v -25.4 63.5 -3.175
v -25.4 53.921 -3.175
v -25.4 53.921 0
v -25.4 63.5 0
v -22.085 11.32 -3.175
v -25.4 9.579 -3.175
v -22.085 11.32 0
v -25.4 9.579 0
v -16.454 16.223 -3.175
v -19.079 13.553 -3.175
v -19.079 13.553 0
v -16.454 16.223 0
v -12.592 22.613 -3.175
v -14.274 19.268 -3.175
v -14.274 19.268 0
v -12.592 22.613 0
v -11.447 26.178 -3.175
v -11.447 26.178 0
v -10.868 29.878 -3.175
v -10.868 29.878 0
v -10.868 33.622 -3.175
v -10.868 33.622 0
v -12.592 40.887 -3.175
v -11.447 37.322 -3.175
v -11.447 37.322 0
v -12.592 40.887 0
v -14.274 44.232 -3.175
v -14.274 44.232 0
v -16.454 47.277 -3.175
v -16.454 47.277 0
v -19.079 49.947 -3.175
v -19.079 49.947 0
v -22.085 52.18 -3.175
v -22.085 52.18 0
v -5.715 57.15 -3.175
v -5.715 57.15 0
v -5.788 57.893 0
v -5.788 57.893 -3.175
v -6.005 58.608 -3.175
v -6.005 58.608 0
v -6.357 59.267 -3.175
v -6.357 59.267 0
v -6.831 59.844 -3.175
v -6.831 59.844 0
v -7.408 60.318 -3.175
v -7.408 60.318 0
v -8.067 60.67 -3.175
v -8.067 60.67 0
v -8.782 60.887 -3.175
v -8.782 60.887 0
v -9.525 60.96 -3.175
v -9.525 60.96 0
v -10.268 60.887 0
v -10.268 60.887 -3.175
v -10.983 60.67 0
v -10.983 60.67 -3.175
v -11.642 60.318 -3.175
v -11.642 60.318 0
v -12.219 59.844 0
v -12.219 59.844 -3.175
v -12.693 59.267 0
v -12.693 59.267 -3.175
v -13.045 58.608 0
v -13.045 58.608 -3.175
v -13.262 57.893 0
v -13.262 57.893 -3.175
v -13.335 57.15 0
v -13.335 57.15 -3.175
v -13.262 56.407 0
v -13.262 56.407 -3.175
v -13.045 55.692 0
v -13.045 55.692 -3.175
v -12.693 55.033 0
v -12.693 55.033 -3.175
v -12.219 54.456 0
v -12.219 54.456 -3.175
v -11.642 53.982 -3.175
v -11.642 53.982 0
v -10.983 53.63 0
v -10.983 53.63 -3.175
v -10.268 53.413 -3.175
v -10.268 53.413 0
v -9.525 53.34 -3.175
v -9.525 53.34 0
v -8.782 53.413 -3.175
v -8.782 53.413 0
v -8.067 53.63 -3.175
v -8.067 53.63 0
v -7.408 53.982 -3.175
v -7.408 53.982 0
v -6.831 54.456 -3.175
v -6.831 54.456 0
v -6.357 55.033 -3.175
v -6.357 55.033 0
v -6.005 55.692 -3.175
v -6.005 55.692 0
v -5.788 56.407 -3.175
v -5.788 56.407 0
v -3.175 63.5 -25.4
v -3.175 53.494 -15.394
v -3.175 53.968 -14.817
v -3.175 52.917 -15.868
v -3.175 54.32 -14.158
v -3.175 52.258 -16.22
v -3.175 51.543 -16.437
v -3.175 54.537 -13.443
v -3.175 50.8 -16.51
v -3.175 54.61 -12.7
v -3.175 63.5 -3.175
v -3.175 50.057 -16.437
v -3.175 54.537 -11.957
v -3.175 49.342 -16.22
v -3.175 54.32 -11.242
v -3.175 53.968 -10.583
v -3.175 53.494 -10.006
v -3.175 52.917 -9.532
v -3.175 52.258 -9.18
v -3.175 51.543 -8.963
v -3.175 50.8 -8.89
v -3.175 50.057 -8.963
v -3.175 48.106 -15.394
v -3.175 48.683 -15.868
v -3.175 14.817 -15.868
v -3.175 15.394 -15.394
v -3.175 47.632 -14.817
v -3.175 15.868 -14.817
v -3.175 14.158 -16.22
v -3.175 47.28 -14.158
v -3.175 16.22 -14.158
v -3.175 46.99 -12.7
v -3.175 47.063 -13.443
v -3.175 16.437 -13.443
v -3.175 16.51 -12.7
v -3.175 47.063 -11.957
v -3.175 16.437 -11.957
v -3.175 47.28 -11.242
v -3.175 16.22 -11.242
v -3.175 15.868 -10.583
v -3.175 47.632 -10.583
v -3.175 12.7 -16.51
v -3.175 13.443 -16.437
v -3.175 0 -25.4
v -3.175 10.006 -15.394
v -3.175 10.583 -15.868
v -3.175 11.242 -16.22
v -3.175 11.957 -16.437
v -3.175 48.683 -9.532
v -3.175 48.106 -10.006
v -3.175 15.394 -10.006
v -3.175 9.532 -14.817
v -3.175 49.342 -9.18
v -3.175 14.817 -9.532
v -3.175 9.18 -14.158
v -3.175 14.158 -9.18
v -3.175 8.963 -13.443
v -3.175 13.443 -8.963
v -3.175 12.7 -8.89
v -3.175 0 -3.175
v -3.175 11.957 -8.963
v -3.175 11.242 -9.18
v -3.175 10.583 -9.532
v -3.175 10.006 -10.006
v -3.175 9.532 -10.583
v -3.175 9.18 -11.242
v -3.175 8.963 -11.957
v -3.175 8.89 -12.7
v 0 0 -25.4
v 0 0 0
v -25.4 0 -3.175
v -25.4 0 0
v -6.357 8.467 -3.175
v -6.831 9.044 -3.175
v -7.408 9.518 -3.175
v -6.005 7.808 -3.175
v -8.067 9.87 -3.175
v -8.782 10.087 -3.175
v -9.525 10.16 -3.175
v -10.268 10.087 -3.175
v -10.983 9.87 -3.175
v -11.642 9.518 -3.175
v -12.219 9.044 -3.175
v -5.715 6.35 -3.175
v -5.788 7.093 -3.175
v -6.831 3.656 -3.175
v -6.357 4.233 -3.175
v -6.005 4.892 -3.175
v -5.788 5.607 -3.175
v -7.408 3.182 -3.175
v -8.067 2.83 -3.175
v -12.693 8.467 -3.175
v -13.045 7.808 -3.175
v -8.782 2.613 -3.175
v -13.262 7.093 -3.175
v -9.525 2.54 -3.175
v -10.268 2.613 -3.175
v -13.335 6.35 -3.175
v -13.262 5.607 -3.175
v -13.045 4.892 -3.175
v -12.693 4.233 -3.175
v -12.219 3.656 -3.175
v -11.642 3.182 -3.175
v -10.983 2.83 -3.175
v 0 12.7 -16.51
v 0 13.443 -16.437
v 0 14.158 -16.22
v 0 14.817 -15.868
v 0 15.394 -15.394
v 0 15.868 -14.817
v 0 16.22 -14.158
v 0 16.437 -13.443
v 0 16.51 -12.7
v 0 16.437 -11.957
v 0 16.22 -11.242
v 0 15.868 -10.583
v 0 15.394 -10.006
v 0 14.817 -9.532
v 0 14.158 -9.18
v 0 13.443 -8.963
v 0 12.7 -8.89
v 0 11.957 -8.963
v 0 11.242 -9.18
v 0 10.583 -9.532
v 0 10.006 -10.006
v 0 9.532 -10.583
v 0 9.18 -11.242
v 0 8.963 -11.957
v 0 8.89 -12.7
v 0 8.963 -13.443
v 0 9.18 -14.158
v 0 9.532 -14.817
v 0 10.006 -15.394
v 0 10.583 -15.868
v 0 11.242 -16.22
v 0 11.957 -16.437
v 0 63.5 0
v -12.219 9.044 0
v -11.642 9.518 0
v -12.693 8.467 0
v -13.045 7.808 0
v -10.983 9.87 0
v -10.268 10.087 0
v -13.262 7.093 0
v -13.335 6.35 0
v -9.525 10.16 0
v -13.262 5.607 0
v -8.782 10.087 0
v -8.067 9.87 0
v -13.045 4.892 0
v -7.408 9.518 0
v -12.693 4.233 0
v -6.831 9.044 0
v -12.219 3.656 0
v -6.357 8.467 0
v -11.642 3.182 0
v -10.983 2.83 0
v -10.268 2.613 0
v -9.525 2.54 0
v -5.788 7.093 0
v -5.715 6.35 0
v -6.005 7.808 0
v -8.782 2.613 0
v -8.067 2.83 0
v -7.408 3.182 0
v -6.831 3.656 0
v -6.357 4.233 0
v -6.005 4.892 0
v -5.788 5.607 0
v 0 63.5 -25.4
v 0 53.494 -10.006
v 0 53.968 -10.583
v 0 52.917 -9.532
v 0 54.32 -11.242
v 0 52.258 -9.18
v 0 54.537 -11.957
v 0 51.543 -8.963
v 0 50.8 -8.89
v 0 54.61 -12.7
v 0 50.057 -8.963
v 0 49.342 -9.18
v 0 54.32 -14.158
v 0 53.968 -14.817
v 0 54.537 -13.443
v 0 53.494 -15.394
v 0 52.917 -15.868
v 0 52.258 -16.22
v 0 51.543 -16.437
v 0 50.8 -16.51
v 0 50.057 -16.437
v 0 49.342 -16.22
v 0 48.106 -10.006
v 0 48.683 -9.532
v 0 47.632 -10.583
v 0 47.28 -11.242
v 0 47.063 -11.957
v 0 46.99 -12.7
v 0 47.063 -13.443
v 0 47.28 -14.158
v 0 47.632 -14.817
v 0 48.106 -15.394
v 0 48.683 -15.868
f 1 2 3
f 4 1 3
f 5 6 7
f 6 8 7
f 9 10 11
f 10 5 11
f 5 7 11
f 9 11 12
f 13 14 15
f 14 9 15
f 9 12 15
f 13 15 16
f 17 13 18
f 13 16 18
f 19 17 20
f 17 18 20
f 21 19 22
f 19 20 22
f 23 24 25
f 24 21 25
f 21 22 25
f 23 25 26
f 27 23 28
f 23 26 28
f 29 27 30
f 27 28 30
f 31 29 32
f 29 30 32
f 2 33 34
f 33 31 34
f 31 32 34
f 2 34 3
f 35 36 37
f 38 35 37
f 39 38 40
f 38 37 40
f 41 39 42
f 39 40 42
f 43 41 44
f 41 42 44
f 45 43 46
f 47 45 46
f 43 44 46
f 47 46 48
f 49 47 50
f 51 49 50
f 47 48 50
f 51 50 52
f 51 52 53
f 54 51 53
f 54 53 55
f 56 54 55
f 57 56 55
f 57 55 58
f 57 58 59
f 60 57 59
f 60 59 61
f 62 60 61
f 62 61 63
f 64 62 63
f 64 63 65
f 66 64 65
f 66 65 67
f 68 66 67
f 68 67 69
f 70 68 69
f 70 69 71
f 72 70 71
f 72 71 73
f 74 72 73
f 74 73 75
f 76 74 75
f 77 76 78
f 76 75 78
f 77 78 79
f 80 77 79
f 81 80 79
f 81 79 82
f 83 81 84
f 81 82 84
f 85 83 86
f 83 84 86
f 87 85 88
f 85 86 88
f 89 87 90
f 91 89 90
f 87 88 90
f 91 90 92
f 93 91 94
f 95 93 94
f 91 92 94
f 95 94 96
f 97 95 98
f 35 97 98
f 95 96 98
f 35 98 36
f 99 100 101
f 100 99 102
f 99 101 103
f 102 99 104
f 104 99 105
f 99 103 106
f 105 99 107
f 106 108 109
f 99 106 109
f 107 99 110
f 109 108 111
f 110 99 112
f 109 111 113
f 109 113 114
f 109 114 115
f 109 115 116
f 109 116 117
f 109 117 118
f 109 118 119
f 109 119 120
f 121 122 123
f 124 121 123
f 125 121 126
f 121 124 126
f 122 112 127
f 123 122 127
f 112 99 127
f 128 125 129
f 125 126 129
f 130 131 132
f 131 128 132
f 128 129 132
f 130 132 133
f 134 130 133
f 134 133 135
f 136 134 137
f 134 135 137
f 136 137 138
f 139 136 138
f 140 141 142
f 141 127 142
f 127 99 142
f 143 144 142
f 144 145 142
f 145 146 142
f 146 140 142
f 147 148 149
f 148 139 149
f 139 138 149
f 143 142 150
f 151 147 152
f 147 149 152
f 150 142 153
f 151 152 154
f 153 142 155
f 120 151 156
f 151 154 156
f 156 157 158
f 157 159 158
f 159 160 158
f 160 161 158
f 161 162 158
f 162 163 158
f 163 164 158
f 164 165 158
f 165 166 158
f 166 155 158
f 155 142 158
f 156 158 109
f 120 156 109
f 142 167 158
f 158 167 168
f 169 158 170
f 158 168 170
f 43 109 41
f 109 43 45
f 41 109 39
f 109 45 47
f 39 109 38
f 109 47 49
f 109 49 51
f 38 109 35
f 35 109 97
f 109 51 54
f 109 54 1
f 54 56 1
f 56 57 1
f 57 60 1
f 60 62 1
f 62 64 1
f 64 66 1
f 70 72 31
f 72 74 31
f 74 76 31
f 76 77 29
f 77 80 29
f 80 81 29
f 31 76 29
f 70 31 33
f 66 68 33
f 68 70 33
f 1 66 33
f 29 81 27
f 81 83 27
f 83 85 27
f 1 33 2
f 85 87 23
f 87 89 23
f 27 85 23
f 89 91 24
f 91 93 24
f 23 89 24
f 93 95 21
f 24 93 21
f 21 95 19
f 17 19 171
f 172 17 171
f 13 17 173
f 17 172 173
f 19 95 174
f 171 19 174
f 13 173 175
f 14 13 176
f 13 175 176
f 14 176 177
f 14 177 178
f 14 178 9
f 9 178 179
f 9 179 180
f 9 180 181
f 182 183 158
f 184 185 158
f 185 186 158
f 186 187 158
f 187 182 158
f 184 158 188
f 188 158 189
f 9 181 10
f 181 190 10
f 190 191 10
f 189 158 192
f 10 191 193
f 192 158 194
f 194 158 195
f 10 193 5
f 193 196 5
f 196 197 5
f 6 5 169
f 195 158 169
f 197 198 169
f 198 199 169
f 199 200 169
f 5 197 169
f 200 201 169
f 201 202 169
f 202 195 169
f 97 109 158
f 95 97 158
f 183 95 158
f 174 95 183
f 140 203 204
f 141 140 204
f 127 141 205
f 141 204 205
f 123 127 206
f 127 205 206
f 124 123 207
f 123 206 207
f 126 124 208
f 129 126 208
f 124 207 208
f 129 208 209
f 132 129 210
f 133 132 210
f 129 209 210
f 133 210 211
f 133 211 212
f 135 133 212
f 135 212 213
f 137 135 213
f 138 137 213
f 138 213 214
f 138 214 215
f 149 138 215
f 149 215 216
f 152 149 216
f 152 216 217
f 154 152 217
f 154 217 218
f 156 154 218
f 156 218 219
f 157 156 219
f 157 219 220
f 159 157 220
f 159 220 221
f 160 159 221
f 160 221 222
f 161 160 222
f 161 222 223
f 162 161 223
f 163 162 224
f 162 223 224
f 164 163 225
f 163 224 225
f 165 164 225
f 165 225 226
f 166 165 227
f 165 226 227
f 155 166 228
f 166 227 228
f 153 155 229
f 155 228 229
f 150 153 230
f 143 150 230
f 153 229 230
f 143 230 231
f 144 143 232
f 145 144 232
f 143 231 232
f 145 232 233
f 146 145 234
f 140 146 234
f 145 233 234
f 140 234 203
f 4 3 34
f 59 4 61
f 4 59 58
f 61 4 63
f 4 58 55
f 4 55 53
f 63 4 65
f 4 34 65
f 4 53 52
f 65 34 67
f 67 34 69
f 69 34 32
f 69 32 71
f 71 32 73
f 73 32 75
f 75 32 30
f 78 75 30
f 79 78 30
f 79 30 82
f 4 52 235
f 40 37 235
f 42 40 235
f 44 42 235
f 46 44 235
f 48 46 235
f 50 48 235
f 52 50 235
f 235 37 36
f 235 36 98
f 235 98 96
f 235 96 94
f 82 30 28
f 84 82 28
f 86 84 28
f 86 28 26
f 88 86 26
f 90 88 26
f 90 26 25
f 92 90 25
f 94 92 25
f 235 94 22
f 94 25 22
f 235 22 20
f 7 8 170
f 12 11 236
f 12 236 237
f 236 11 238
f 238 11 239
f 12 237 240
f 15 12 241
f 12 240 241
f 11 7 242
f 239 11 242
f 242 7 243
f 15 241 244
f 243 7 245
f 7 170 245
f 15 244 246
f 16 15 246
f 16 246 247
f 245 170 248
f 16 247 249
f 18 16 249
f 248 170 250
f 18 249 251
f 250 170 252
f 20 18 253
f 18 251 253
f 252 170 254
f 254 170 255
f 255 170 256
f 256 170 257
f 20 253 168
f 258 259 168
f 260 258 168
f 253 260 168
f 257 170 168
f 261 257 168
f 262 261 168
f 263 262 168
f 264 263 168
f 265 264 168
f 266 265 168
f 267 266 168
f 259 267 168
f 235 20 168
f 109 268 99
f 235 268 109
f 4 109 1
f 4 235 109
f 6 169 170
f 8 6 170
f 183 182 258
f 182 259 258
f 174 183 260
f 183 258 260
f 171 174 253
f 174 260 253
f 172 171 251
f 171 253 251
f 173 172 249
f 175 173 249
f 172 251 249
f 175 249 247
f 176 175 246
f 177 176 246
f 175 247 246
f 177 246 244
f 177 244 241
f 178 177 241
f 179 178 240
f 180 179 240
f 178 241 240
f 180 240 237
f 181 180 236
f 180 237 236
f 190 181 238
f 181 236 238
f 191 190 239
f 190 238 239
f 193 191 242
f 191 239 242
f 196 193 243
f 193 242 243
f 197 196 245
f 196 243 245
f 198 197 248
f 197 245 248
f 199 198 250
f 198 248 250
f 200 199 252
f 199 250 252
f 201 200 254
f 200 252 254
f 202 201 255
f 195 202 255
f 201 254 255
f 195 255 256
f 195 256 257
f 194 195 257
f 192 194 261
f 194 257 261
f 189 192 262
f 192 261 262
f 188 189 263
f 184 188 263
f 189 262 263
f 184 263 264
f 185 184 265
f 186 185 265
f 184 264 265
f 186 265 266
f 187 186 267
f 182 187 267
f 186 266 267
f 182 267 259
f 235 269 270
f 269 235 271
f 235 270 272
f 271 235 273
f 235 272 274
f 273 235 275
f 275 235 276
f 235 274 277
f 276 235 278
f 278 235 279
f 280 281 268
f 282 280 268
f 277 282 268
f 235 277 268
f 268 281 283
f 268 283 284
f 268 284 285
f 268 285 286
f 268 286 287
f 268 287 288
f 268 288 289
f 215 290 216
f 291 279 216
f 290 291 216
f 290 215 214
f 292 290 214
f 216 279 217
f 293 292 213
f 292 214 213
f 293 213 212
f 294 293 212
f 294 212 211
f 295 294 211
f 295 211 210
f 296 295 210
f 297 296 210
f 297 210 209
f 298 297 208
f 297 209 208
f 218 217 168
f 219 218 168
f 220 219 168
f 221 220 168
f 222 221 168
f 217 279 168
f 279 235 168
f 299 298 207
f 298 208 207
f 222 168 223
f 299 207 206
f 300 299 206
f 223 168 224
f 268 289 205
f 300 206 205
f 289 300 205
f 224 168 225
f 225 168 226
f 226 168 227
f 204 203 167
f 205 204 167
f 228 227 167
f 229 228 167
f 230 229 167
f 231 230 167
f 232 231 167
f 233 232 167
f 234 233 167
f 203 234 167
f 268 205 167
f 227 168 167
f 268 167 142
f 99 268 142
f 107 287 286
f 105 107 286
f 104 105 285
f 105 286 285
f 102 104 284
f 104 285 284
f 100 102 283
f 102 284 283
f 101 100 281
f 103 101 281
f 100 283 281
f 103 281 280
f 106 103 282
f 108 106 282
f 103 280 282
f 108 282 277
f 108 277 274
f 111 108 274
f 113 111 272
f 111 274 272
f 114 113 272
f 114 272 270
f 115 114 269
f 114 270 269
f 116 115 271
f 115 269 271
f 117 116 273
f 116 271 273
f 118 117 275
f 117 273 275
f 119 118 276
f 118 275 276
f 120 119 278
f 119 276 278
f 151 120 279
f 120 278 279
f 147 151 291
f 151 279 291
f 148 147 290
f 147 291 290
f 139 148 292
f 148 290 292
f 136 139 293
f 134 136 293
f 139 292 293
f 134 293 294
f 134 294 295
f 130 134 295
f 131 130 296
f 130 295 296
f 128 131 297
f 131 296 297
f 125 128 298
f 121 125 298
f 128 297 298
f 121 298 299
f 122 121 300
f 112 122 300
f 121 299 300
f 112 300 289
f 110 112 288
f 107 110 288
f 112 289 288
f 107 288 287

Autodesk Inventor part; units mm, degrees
ref_plane "YZ Plane" through (0, 0, 0) normal (1, 0, 0) x (0, 1, 0)
ref_plane "XZ Plane" through (0, 0, 0) normal (0, 1, 0) x (-1, 0, 0)
ref_plane "XY Plane" through (0, 0, 0) normal (0, 0, 1) x (1, 0, 0)
sketch "Sketch1" plane through (0, 0, 0) normal (0, 1, 0) x (-1, 0, 0)
  line L0 (0, 0) -> (0, -25.4)
  line L1 (0, -25.4) -> (3.175, -25.4)
  line L2 (3.175, -25.4) -> (3.175, -3.175)
  line L3 (3.175, -3.175) -> (25.4, -3.175)
  line L4 (25.4, -3.175) -> (25.4, 0)
  line L5 (25.4, 0) -> (0, 0)
  dimension "d0" = 25.4
  dimension "d1" = 3.175
  dimension "d2" = 22.225
  dimension "d3" = 22.225
extrude "Extrusion1" add sketch "Sketch1" along normal blind 63.5
sketch "Sketch2" plane through (-25.4, 0, 0) normal (0, 0, 1) x (1, 0, 0)
  line L0 (22.225, 0) -> (22.225, 63.5) projected
  line L1 (22.225, 0) -> (15.875, 0)
  line L2 (22.225, 0) -> (0, 0) projected
  line L3 (22.225, 63.5) -> (0, 63.5) projected
  circle A0 centre (15.875, 57.15) radius 3.81
  circle A1 centre (15.875, 6.35) radius 3.81
  circle A2 centre (-9.525, 31.75) radius 24.13
  line L4 (22.225, 31.75) -> (-9.525, 31.75)
  point P0 (25.4, 0)
  dimension "d6" = 6.35
  dimension "d9" = 7.62
  dimension "d10" = 7.62
  dimension "d12" = 31.75
extrude "Extrusion2" cut sketch "Sketch2" against normal blind 63.5
sketch "Sketch3" plane through (0, 0, 0) normal (1, 0, 0) x (0, 0, -1)
  line L0 (25.4, 0) -> (25.4, 63.5) projected
  circle A0 centre (12.7, 12.7) radius 3.81
  line L1 (0, 9.5795) -> (0, 53.9205) projected
  circle A1 centre (12.7, 50.8) radius 3.81
  point P0 (0, 0)
extrude "Extrusion3" cut sketch "Sketch3" against normal blind 63.5
properties part number "Bracket"
